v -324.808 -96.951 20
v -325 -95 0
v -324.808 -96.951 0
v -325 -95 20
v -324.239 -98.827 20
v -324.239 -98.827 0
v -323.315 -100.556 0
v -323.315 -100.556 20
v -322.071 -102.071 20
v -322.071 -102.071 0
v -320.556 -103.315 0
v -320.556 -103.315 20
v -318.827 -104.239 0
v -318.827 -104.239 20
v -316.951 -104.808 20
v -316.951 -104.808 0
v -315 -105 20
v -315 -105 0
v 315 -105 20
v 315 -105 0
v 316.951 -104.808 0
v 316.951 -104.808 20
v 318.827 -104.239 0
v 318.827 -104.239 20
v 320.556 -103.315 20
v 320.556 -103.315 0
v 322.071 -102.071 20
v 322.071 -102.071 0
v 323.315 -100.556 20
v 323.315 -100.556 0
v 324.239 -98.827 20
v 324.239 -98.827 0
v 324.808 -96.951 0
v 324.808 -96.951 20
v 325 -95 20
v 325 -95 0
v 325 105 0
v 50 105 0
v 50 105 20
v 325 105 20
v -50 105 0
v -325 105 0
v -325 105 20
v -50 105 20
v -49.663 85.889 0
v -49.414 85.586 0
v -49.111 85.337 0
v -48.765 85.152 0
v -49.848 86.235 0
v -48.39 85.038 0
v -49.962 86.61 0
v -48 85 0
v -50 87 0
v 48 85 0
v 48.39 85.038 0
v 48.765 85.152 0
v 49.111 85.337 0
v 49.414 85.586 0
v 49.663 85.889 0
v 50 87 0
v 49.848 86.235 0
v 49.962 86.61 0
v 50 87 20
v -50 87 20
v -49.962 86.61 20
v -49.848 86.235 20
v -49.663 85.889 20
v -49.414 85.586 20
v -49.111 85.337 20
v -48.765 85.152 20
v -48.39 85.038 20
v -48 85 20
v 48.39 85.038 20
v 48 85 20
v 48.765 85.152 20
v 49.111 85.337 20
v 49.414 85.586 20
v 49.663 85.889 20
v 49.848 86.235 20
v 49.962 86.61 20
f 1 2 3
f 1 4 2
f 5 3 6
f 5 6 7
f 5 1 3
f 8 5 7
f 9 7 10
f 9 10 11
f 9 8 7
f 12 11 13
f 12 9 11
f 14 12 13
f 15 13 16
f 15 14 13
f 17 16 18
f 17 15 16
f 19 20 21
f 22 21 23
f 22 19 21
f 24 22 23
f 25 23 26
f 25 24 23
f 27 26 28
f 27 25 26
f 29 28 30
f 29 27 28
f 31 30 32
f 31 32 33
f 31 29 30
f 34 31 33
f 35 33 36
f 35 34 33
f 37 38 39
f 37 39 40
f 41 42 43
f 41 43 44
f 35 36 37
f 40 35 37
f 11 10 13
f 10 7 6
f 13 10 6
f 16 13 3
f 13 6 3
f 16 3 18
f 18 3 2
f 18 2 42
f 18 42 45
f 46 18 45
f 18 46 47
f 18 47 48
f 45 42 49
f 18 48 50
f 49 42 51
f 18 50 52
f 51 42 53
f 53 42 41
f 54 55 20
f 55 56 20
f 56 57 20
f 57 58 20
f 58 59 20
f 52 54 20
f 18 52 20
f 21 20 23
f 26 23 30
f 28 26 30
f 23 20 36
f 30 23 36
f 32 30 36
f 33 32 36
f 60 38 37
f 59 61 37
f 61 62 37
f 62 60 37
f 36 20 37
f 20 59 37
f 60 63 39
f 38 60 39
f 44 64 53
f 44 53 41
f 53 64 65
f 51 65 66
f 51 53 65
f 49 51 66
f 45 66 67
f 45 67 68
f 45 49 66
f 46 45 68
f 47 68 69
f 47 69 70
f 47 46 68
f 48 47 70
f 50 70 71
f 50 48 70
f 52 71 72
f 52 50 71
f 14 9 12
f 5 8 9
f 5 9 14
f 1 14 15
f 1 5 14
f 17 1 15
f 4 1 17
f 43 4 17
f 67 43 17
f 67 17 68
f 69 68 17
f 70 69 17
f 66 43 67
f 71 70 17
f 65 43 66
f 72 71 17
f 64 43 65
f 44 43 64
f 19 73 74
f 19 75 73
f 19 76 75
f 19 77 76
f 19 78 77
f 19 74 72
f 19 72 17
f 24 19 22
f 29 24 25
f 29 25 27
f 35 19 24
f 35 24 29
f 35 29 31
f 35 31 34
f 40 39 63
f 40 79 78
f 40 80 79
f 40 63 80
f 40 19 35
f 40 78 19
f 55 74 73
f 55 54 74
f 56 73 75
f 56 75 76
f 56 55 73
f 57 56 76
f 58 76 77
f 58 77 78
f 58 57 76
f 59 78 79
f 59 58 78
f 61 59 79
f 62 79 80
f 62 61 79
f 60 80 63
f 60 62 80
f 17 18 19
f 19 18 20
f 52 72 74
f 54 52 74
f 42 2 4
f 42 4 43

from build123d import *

# Parameters (mm, degrees)
F0_W     = 650
F0_H     = 210
F1_DEPTH = 20
F2_W     = 100
F2_H     = 20
F3_DEPTH = 20.001
F4_R     = 10
F5_R     = 2


with BuildPart() as f1:
    # F0 (on Top) → F1 (new body)
    with BuildSketch(Plane.XY):
        Rectangle(F0_W, F0_H)
    extrude(amount=F1_DEPTH)

    # F2 (on face) → F3 (cut, through all)
    with BuildSketch(Plane.XY.offset(20)):
        with Locations((0, 95)):
            Rectangle(F2_W, F2_H)
    extrude(amount=-F3_DEPTH, mode=Mode.SUBTRACT)

    # F4
    f4_edges = [f1.edges().sort_by_distance(p)[0] for p in [
        (-325, -105, 10),
        (325, -105, 10),
    ]]
    fillet(f4_edges, radius=F4_R)

    # F5
    f5_edges = [f1.edges().sort_by_distance(p)[0] for p in [
        (-50, 85, 10),
        (50, 85, 10),
    ]]
    fillet(f5_edges, radius=F5_R)


solid = f1.part
